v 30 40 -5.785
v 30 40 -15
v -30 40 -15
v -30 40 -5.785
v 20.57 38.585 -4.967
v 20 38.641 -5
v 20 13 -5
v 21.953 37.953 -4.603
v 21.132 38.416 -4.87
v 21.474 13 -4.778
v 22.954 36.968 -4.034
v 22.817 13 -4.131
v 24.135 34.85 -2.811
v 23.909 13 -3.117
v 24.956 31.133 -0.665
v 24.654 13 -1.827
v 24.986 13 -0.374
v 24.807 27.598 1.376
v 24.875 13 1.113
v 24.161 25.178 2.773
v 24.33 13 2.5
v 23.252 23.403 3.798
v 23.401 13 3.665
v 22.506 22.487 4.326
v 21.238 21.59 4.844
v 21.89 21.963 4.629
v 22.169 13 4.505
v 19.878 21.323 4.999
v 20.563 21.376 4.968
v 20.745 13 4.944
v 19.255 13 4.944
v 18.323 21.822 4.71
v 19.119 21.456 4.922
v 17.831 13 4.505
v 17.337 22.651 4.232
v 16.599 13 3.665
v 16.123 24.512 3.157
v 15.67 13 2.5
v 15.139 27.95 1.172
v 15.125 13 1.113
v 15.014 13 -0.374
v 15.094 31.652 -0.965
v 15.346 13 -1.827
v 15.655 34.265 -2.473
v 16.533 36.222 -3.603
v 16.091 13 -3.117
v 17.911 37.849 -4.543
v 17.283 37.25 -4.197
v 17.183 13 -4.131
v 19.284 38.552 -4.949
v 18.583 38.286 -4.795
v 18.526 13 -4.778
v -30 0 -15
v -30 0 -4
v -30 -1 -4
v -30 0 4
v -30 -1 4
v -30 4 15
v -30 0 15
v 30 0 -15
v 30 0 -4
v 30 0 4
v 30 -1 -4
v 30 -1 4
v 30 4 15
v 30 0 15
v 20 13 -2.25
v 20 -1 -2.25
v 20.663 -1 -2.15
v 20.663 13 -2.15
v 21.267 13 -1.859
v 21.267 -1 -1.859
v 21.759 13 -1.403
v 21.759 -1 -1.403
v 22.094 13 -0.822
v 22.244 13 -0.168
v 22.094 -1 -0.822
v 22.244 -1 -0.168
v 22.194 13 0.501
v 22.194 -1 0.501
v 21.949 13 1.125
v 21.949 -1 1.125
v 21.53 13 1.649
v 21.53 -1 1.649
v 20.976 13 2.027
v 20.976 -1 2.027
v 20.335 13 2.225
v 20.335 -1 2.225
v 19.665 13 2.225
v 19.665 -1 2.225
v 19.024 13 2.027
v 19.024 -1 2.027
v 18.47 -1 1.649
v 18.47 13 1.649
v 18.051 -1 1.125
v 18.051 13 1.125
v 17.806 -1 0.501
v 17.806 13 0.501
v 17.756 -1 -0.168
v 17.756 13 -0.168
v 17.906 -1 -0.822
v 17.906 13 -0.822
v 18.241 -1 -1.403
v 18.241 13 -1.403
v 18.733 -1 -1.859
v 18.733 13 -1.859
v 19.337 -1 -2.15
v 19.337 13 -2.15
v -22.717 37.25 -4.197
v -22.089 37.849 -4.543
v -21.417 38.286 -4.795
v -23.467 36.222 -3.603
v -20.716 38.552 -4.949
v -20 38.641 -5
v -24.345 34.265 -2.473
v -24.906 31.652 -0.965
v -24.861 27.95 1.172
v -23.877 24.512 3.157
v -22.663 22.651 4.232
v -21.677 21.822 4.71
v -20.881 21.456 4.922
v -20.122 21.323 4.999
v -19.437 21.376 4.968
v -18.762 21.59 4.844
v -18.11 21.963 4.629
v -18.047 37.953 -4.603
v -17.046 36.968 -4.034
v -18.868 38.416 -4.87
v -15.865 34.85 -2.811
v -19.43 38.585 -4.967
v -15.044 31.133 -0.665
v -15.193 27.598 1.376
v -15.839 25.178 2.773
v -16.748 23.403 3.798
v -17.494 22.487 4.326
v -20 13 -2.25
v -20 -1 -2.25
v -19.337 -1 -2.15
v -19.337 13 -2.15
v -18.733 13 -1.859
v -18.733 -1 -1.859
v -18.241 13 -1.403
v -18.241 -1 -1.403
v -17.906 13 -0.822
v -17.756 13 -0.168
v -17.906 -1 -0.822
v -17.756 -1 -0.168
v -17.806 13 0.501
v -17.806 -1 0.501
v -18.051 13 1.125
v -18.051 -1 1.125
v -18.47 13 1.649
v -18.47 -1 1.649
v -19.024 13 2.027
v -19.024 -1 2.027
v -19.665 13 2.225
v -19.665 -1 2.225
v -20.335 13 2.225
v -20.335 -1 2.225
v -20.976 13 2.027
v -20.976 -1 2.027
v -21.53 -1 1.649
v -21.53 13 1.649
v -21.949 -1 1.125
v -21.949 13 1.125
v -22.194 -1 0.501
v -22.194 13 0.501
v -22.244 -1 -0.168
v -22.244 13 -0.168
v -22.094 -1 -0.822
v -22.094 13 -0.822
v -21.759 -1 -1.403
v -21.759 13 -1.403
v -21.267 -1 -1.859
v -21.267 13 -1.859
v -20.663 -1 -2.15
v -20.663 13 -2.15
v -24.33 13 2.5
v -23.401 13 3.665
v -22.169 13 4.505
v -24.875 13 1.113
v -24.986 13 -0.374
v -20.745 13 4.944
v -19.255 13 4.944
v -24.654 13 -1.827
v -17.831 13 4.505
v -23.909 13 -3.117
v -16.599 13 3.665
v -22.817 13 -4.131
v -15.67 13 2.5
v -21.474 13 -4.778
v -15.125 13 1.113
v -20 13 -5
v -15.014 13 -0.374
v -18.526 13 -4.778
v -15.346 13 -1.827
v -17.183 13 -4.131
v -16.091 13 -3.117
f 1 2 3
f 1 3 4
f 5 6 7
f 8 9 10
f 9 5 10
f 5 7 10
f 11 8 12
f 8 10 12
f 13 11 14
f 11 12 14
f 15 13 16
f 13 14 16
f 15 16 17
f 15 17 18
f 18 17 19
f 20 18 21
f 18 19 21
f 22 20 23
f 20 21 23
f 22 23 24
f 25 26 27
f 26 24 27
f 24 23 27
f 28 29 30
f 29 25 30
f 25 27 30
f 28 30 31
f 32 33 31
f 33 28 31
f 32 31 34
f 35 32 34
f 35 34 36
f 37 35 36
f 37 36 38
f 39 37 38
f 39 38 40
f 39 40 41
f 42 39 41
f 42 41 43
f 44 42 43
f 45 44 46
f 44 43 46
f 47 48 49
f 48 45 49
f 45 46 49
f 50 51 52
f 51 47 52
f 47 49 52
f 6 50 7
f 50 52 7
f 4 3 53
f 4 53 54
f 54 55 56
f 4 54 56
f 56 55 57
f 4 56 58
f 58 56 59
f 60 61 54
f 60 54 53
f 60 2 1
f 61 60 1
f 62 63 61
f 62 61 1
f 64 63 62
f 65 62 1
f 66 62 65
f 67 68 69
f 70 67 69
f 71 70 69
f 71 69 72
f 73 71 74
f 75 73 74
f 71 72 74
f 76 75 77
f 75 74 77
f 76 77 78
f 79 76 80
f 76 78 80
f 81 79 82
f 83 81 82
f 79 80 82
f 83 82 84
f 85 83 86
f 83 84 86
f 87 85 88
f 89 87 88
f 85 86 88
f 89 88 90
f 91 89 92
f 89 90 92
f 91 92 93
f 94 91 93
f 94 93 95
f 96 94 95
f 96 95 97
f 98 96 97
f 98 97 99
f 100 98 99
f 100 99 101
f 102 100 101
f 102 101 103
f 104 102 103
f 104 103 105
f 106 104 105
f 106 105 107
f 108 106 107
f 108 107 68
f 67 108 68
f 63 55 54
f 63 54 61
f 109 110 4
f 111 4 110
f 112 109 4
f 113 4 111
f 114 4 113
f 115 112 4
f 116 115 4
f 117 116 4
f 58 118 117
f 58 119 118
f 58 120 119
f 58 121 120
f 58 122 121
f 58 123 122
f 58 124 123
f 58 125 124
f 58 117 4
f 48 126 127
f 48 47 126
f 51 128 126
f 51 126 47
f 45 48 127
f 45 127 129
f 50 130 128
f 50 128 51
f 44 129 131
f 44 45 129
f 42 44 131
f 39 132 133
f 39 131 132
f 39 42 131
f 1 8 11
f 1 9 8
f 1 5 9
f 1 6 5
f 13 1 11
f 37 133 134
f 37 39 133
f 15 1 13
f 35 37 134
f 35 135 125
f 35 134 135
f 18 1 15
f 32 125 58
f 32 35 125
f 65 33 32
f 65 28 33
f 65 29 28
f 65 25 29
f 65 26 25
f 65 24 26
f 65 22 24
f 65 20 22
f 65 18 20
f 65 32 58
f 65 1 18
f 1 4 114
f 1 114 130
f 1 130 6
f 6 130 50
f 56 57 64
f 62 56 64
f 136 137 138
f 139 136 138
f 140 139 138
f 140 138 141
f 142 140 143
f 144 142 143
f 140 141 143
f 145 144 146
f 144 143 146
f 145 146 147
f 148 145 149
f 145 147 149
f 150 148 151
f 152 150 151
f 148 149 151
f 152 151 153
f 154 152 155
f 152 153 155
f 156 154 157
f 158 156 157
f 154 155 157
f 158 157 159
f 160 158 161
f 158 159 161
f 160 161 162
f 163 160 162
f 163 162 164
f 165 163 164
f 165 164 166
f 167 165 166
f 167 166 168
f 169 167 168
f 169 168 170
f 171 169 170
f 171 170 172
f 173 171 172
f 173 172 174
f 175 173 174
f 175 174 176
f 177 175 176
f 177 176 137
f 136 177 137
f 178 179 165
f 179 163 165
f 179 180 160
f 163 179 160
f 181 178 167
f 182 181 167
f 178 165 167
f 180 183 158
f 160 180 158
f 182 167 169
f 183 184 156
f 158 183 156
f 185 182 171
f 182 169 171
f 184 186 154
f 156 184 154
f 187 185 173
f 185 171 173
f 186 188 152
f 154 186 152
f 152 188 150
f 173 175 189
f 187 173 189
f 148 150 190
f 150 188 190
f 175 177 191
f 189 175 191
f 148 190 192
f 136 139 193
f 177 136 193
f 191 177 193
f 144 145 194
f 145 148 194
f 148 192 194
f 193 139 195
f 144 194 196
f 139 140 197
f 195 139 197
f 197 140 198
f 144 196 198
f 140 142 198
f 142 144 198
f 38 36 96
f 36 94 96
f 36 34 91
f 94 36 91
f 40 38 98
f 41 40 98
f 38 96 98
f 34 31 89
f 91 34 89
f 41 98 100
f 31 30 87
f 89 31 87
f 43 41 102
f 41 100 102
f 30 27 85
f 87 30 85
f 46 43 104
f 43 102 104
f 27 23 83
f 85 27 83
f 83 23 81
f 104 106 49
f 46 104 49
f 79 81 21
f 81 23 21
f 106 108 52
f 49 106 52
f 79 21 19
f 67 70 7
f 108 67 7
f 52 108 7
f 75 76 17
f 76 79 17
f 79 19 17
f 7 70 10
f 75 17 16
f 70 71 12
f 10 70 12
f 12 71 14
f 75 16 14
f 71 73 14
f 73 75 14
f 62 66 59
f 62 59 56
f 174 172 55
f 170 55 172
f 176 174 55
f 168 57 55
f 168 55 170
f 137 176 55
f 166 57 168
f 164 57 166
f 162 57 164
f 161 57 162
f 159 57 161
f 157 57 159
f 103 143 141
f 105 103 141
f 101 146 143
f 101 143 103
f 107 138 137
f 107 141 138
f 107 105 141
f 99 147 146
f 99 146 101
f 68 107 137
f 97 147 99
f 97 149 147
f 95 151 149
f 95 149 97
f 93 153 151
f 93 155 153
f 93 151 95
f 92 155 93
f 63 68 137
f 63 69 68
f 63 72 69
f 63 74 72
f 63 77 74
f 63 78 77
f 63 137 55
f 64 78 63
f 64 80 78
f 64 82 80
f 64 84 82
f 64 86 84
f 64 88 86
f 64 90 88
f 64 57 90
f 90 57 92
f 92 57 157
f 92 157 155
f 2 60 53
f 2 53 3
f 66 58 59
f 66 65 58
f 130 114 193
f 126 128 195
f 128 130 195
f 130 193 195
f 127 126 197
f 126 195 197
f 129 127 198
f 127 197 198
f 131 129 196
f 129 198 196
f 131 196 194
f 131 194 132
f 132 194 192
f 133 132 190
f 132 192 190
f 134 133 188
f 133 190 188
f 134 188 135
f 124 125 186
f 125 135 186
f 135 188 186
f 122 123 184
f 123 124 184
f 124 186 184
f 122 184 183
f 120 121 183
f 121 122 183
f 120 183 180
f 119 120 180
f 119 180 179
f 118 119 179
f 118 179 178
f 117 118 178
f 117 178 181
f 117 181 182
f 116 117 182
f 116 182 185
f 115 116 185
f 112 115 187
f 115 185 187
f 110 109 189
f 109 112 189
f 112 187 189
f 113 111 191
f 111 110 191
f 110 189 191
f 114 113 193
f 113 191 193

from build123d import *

# Parameters (mm, degrees)
BOSS_EXTRUDE1_DEPTH = 30
SKETCH2_R           = 2.25
CUT_EXTRUDE1_DEPTH  = 53.201532545
CUT_EXTRUDE2_START  = -13
SKETCH3_R           = 5
CUT_EXTRUDE2_DEPTH  = 40.201532545
BOSS_EXTRUDE2_START = 1
SKETCH4_W           = 60
SKETCH4_H           = 8
SKETCH4_R           = 2.25
BOSS_EXTRUDE2_DEPTH = 1


with BuildPart() as part:
    # Sketch1 → Boss-Extrude1 (new, symmetric)
    with BuildSketch(Plane(origin=(0, 0, 0), x_dir=(0, 0, -1), z_dir=(1, 0, 0))):
        Polygon((-15, 0), (15, 0), (15, 40), (5.784609691, 40), (-15, 4), align=None)
    extrude(amount=BOSS_EXTRUDE1_DEPTH, both=True)

    # Sketch2 → Cut-Extrude1 (cut, through all)
    with BuildSketch(Plane.XZ):
        with Locations(Location((-20, 0, 0), (0, 0, 270))):
            Circle(SKETCH2_R)
        with Locations(Location((20, 0, 0), (0, 0, 270))):
            Circle(SKETCH2_R)
    extrude(amount=-CUT_EXTRUDE1_DEPTH, mode=Mode.SUBTRACT)

    # Sketch3 → Cut-Extrude2 (cut, through all)
    with BuildSketch(Plane.XZ.offset(CUT_EXTRUDE2_START)):
        with Locations(Location((-20, 0, 0), (0, 0, 270))):
            Circle(SKETCH3_R)
        with Locations(Location((20, 0, 0), (0, 0, 270))):
            Circle(SKETCH3_R)
    extrude(amount=-CUT_EXTRUDE2_DEPTH, mode=Mode.SUBTRACT)

    # Sketch4 → Boss-Extrude2 (add)
    with BuildSketch(Plane.XZ.offset(BOSS_EXTRUDE2_START)):
        Rectangle(SKETCH4_W, SKETCH4_H)
        with Locations(Location((-20, 0, 0), (0, 0, 270))):
            Circle(SKETCH4_R, mode=Mode.SUBTRACT)
        with Locations(Location((20, 0, 0), (0, 0, 270))):
            Circle(SKETCH4_R, mode=Mode.SUBTRACT)
    extrude(amount=-BOSS_EXTRUDE2_DEPTH)


solid = part.part
